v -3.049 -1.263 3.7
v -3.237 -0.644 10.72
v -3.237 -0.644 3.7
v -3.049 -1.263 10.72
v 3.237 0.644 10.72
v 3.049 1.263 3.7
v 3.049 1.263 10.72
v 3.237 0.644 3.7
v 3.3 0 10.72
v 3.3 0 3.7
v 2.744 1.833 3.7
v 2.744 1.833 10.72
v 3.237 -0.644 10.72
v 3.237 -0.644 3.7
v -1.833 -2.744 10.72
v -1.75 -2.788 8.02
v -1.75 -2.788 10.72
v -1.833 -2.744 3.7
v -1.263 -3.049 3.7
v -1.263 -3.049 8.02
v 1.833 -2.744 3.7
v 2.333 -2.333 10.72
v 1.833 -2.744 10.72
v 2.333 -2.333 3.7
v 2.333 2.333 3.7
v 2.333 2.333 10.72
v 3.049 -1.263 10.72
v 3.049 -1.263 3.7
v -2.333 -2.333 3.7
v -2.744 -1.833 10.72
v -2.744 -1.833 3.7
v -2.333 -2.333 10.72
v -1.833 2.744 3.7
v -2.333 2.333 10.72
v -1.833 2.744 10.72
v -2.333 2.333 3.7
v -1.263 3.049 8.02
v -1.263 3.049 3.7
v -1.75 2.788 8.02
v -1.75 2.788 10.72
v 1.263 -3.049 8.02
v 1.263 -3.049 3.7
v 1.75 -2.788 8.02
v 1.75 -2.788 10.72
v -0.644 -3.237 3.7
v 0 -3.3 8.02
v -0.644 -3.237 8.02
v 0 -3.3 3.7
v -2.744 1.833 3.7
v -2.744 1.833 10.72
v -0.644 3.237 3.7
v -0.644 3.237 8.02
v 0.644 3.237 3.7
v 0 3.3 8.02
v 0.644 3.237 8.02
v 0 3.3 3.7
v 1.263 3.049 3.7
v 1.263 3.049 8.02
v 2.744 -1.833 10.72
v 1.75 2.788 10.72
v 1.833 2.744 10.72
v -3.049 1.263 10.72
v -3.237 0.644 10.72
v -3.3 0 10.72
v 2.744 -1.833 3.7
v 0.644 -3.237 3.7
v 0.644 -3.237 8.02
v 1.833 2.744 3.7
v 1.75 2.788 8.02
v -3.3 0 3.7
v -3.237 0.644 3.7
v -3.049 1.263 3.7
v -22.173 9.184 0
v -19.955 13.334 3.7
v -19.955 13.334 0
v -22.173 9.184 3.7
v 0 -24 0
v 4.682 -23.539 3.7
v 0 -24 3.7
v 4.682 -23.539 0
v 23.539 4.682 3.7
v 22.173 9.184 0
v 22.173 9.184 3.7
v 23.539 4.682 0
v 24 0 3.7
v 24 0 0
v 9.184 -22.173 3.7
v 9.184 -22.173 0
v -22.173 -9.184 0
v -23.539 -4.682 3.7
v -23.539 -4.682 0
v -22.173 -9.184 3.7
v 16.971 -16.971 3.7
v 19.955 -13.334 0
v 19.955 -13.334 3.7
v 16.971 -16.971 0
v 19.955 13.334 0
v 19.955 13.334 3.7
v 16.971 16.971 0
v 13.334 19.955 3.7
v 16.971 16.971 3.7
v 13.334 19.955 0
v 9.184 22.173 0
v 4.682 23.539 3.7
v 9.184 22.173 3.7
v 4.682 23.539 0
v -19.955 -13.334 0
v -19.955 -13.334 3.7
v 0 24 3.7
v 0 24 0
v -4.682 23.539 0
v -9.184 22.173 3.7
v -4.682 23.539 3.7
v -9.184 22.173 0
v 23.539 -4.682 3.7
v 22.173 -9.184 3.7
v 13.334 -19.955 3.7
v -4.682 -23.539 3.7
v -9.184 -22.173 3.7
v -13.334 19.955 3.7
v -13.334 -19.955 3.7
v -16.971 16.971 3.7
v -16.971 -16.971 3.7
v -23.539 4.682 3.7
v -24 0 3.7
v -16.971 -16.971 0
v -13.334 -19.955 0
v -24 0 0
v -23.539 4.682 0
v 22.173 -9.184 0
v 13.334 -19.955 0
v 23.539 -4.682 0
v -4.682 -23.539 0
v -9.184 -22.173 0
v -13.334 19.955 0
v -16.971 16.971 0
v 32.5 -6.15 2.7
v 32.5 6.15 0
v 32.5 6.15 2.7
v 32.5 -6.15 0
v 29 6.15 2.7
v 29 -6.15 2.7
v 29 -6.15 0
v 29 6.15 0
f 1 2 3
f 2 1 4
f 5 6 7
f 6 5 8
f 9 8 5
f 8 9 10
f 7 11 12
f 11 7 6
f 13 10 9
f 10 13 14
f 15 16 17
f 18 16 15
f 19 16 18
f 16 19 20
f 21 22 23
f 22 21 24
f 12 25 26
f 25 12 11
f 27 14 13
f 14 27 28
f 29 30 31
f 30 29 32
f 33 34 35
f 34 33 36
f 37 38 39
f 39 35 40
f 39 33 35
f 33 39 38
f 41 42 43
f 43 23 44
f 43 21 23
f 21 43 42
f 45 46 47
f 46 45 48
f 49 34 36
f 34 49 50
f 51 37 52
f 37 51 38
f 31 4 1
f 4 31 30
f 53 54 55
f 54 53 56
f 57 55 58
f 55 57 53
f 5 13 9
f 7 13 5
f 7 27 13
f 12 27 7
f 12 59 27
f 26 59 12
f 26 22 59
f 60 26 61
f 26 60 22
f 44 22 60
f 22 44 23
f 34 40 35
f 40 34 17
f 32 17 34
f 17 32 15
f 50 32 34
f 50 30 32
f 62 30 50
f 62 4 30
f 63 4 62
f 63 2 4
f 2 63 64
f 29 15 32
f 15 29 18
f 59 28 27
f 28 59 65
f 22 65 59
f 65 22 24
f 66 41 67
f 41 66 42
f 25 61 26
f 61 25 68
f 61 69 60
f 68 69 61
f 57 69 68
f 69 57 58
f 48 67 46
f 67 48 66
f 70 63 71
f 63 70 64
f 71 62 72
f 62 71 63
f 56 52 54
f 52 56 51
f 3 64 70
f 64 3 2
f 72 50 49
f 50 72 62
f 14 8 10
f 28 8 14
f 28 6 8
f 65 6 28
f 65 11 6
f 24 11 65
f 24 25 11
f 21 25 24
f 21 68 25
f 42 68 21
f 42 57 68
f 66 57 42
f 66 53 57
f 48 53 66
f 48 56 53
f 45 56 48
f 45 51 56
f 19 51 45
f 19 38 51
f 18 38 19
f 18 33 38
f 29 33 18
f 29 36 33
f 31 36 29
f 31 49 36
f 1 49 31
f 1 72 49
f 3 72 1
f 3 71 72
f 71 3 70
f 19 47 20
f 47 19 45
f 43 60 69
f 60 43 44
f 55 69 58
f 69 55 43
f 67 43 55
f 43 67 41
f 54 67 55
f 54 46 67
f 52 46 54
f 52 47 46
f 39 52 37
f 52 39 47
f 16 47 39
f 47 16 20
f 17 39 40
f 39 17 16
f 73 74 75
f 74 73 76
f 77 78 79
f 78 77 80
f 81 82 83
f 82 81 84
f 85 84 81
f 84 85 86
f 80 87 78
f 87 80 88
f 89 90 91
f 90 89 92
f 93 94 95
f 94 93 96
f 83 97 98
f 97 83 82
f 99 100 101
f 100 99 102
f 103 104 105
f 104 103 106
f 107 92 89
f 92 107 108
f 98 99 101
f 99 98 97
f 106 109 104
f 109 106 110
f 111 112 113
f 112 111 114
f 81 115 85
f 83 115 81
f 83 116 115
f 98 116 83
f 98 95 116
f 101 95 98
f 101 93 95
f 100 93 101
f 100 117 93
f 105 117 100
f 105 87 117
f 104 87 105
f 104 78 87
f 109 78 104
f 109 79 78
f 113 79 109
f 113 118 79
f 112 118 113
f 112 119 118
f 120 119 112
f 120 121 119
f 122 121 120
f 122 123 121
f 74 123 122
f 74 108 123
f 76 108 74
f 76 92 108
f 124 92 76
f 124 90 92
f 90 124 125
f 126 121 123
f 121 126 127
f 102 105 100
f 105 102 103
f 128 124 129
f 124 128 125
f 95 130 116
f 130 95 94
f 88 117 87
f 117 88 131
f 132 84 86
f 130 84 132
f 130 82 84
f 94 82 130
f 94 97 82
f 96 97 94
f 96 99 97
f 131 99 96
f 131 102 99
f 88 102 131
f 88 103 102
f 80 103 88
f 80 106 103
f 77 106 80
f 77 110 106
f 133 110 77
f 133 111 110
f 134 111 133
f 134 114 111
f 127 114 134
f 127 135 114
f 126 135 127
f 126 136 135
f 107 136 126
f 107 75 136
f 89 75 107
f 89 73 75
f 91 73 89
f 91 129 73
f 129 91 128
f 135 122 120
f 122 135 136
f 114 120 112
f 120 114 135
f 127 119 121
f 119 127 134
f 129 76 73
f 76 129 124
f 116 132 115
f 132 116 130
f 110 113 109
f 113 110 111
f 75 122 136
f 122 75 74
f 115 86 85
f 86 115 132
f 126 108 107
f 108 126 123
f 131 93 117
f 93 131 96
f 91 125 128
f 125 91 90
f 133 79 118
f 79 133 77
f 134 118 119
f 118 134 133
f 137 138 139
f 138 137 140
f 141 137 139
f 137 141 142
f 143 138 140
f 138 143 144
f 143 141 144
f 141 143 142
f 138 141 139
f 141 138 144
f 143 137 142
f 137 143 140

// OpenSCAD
d = 48;
h = 3.7;
inner_d = 6.6;
$fn = 32;

inner_h = 7.02;
c_d = 2.7;
c_w = 3.5;
c_h = 12.3;

print_margin = 5;

//helmet_nut();
print_helmet_nut();

module print_helmet_nut() {
	nut_cylinder();
	translate([0, 0, h])
		difference() {
			thread();
			translate([-c_w / 2, -c_h / 2, inner_h - c_d])
				latch();
		}

	translate([d / 2 + print_margin, -c_h / 2, 0])
		latch();
}

module helmet_nut() {
	nut_cylinder();
	translate([0, 0, h]) {
		thread();
		translate([-c_w / 2, -c_h / 2, inner_h - c_d])
			latch();
	}
}

module nut_cylinder() {
	cylinder(h = 3.7, d = 48);
}

module thread() {
	cylinder(h = inner_h, d = inner_d);
}

module latch() {
	cube([c_w, c_h, c_d]);
}
